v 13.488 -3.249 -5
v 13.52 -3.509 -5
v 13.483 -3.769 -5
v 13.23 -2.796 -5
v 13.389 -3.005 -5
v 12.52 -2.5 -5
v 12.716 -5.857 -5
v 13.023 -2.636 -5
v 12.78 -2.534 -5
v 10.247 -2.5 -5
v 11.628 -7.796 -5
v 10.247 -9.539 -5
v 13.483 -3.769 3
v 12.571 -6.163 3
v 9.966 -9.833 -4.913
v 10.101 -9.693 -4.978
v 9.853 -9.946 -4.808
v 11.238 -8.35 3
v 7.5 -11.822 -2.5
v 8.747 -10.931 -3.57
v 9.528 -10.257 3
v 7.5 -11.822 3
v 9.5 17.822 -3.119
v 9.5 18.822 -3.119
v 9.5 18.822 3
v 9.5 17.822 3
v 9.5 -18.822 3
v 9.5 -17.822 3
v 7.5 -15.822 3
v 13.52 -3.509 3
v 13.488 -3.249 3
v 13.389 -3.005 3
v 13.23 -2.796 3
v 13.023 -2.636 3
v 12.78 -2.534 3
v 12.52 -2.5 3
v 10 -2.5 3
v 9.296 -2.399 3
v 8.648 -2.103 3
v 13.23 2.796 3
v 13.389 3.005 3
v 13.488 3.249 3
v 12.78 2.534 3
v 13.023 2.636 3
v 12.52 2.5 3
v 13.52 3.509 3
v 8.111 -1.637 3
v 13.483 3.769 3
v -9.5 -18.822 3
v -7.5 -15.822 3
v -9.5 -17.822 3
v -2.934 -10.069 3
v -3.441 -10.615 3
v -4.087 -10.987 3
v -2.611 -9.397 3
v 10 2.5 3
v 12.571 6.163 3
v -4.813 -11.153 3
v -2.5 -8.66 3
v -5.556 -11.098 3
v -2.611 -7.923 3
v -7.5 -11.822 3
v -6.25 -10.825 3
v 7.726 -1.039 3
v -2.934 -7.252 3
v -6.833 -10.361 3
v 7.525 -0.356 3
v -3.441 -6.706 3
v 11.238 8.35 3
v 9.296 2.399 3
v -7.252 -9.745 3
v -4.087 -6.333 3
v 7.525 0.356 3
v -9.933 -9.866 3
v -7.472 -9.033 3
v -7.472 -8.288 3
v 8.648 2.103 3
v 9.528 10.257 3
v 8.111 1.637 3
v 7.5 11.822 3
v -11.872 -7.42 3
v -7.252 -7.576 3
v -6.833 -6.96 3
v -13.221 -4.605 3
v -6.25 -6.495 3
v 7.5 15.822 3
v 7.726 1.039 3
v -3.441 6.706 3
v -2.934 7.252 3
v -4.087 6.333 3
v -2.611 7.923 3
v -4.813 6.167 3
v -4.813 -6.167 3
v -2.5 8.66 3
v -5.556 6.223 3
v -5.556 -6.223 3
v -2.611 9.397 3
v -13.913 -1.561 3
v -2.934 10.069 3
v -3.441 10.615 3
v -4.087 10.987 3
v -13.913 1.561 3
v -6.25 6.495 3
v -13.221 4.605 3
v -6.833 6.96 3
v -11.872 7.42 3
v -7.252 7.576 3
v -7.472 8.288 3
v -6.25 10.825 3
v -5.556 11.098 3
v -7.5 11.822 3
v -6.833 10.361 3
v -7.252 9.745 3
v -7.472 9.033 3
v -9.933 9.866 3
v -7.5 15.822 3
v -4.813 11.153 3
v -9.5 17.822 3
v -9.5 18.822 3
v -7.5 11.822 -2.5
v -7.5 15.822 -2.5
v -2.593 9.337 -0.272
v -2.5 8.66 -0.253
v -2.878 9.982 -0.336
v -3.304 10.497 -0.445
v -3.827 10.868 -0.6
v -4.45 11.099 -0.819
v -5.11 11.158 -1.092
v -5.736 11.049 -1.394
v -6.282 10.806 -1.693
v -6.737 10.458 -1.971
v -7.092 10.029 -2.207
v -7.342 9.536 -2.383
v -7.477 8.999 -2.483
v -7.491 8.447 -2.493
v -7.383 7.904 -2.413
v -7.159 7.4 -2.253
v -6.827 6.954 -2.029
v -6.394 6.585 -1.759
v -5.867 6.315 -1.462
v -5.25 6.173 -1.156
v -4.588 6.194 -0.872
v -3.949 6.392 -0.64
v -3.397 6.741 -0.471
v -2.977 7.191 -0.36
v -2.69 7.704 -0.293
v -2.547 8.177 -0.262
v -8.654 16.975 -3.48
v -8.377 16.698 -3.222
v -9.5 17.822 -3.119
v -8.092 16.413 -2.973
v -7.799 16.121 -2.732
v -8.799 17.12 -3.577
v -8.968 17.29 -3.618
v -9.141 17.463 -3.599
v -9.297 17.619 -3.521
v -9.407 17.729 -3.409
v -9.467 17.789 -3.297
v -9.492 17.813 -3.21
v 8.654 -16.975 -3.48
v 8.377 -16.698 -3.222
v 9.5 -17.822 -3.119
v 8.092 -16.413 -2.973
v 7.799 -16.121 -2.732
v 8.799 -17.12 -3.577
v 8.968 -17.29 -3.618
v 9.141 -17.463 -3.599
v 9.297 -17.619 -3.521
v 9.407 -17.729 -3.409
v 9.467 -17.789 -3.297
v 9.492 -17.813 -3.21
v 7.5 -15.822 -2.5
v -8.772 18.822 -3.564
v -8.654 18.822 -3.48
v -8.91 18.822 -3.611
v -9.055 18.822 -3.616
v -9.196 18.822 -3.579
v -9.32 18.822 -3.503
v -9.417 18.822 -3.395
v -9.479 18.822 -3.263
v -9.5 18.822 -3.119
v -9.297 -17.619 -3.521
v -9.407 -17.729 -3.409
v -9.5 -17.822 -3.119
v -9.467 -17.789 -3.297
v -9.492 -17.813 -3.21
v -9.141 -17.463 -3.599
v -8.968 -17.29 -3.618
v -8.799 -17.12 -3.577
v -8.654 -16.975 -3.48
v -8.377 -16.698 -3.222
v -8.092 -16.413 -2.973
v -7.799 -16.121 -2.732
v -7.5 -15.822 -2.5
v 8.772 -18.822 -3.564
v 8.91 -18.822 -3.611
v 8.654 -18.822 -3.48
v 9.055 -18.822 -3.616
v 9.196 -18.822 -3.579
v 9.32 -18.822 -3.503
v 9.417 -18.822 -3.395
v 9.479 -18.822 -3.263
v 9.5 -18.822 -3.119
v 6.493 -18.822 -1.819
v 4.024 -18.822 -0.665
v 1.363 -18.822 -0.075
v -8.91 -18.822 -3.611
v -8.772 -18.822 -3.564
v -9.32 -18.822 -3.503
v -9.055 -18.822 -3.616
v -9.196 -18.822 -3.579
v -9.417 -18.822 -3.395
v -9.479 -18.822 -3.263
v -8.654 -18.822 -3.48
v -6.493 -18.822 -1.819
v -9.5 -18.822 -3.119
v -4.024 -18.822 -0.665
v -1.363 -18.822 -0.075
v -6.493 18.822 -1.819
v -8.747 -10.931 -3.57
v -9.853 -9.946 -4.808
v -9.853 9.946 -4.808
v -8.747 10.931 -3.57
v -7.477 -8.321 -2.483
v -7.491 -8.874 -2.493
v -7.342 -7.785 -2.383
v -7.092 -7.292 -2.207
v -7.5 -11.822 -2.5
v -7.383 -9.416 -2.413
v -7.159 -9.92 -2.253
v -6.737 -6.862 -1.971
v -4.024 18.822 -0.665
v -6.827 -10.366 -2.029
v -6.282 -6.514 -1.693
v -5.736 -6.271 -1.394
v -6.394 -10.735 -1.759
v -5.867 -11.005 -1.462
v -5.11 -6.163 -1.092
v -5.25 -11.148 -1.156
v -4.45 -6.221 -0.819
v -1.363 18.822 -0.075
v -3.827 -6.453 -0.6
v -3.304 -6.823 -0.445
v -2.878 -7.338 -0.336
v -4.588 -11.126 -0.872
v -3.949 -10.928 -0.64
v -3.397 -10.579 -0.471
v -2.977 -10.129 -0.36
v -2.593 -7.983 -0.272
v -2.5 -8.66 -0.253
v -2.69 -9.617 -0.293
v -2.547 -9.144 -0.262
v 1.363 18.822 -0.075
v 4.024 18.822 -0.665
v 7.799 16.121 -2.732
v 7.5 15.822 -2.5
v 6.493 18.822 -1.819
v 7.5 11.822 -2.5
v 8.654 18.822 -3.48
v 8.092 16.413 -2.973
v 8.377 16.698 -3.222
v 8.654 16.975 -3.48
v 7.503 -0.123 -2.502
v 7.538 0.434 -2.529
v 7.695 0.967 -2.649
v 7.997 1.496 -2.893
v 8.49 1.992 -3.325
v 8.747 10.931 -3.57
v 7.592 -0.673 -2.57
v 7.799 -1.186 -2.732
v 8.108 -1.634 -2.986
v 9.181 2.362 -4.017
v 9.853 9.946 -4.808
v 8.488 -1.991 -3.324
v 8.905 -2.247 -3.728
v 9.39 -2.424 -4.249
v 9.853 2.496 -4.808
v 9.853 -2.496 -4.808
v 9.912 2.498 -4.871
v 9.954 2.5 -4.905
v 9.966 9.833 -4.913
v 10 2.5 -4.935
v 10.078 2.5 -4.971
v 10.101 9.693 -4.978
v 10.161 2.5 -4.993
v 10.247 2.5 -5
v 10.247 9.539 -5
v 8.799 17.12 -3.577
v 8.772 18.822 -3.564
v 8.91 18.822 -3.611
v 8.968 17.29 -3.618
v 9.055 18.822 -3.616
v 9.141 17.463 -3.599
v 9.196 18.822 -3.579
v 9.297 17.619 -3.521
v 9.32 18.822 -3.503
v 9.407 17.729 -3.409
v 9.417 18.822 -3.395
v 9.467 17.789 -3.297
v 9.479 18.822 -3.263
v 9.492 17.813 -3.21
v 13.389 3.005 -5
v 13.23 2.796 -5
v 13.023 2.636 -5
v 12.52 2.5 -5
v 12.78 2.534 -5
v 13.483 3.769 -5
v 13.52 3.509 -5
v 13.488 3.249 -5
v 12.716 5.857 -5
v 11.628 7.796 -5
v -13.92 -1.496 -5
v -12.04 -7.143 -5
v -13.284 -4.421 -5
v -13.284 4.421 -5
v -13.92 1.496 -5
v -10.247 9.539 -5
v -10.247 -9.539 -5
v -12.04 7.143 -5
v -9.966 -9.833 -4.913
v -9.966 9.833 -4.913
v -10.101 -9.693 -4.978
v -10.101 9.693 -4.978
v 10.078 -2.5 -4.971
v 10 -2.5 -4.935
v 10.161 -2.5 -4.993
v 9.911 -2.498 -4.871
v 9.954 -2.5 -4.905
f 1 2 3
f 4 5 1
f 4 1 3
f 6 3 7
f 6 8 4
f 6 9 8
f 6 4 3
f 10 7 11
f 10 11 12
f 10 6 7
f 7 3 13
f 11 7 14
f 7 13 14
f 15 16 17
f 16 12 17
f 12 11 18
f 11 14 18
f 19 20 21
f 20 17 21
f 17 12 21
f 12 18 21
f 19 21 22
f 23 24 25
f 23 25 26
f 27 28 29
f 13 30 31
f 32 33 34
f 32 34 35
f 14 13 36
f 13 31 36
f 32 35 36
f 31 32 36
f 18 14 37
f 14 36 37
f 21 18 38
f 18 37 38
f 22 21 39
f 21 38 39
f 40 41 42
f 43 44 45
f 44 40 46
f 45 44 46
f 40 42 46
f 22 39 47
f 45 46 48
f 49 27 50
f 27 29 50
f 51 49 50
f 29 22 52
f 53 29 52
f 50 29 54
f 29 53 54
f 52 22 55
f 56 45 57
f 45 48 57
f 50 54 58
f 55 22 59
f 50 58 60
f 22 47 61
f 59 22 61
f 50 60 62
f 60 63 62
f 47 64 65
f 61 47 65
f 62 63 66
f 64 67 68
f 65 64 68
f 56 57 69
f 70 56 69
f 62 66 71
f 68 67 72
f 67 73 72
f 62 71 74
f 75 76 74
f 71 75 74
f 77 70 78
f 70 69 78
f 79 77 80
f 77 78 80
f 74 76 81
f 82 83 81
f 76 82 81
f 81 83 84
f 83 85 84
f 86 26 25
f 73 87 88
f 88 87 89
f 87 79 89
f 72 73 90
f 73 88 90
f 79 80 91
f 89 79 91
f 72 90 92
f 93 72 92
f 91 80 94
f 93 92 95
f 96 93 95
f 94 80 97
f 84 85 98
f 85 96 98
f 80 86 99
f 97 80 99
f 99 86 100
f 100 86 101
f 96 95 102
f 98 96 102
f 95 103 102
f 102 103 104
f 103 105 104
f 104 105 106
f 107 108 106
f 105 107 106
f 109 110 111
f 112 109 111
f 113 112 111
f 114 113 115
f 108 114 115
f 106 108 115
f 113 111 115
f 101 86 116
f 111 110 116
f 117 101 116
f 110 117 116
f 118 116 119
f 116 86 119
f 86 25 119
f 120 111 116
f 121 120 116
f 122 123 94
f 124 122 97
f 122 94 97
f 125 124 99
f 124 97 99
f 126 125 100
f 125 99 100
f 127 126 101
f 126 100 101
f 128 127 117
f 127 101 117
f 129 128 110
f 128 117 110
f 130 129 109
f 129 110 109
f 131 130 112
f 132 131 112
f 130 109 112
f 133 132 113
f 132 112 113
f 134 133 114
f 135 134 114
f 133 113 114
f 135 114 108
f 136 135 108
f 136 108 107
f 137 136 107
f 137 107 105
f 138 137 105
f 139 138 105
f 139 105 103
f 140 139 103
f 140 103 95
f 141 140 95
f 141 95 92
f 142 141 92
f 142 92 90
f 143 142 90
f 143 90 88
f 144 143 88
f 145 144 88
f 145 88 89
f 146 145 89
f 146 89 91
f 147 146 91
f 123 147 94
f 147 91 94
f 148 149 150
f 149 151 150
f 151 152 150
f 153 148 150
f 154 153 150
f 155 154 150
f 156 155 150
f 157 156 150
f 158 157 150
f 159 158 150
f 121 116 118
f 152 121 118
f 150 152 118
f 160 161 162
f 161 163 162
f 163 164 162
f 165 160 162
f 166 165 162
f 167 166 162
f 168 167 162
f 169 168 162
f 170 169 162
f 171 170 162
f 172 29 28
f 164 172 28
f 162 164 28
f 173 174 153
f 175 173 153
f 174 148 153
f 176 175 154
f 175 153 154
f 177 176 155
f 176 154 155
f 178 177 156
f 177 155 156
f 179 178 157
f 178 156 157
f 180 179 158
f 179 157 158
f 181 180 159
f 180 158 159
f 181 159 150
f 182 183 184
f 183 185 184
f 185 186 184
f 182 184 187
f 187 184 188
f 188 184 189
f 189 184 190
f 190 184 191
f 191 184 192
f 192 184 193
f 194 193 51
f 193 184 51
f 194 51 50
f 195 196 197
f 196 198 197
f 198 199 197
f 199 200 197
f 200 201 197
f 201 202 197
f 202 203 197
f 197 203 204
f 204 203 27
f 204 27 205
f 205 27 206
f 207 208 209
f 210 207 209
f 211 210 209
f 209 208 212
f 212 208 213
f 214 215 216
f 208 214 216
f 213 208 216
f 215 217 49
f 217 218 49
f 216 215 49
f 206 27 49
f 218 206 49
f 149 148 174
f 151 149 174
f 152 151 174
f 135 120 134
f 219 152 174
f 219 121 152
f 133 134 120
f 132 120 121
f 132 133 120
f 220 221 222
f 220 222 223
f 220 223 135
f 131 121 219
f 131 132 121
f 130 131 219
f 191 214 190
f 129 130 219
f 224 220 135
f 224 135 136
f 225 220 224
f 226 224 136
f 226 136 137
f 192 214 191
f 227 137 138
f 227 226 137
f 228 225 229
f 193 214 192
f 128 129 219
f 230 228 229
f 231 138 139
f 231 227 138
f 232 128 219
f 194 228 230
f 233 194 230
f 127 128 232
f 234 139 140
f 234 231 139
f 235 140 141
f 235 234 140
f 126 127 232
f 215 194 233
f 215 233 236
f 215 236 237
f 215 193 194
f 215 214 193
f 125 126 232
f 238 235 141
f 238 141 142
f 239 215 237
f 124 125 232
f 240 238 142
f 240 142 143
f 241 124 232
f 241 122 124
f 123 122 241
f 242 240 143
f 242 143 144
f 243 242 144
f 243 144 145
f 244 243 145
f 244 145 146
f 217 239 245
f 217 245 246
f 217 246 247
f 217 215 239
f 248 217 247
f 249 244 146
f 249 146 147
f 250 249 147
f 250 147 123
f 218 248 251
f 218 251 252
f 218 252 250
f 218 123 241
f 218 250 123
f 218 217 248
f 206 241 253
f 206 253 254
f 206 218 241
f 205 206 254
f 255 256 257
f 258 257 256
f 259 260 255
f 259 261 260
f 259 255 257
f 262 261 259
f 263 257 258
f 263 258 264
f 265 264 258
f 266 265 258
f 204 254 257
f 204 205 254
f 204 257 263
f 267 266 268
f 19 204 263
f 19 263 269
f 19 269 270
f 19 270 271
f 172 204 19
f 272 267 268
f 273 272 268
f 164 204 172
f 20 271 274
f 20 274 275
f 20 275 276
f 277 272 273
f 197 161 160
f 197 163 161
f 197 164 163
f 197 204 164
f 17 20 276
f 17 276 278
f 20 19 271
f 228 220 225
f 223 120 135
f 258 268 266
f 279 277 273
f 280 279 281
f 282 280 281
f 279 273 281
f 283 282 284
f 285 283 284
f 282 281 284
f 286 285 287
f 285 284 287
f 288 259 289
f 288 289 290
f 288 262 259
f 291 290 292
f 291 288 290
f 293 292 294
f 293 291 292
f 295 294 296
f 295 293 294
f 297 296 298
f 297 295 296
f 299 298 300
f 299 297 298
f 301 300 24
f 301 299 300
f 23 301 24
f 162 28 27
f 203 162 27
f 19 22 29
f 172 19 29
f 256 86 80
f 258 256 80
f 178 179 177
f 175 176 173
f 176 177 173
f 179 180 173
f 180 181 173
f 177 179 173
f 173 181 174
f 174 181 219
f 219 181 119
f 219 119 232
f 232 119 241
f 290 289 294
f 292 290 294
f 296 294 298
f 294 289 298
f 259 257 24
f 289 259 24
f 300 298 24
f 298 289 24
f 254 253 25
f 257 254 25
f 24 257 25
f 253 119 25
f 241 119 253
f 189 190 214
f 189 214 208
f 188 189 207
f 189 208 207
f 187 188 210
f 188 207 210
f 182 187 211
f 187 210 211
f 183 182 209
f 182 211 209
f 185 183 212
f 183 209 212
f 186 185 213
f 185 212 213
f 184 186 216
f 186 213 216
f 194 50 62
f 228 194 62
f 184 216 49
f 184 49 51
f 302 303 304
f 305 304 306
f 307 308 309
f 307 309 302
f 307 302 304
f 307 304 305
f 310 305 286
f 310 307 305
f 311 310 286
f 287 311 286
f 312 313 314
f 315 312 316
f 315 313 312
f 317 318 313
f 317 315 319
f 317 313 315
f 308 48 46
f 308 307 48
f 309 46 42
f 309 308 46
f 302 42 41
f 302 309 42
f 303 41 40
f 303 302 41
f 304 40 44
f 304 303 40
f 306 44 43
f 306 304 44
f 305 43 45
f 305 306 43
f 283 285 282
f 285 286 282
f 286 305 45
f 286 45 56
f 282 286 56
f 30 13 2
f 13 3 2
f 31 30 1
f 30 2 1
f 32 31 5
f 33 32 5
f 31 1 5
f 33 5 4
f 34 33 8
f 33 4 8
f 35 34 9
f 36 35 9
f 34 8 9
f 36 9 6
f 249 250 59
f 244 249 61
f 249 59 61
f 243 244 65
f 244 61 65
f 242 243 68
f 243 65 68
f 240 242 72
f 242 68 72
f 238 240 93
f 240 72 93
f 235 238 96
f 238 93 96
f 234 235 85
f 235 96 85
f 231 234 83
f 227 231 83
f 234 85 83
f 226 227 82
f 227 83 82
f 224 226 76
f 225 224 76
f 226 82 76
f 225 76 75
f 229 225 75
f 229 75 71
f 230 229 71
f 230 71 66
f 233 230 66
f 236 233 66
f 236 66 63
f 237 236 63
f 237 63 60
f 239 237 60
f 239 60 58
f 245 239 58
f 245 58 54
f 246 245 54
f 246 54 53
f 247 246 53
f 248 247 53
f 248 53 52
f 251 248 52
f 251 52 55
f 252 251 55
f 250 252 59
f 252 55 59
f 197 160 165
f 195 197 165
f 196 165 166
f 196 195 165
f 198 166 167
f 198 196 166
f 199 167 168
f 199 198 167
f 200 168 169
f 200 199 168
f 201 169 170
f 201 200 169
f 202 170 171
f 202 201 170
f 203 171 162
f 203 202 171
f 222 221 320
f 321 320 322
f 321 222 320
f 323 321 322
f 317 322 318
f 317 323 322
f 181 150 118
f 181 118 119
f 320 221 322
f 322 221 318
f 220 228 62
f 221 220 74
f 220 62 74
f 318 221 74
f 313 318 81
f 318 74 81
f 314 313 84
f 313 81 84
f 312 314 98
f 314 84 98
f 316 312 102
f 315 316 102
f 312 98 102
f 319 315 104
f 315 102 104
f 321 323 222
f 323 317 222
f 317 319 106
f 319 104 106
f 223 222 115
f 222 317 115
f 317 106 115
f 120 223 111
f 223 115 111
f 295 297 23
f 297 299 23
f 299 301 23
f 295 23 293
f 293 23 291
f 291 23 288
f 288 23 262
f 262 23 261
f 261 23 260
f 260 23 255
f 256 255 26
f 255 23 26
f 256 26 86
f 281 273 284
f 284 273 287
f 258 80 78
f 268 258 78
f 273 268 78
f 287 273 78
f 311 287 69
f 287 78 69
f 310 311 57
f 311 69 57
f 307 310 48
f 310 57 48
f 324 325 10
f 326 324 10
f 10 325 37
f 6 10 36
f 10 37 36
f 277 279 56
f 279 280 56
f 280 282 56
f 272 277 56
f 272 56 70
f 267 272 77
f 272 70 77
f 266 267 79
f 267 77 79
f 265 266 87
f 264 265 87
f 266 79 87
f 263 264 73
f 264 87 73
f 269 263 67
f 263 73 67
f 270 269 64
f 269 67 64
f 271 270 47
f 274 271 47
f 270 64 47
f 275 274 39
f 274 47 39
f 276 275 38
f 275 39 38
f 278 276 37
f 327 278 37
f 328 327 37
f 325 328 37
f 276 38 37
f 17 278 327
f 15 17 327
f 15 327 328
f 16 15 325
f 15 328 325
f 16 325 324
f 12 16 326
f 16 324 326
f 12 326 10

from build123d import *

# Parameters (mm, degrees)
SKETCH1_R               = 1.350662837
BOSS_EXTRUDE1_DEPTH     = 3
BOSS_EXTRUDE2_OUTLINE_R = 1.350662837
BOSS_EXTRUDE2_DEPTH     = 5
BOSS_EXTRUDE2_START     = -18.821590418
BOSS_EXTRUDE2_2_DEPTH   = 37.643180836
FILLET1_R               = 0.5
SKETCH5_R               = 2.5
CUT_EXTRUDE1_DEPTH      = 25.78411334
FILLET2_R               = 0.5
FILLET3_R               = 1


with BuildPart() as part:
    # Sketch1 → Boss-Extrude1 (new body)
    with BuildSketch(Plane.XY):
        with BuildLine():
            Line((7.5, 18.821590418), (9.5, 18.821590418))
            Line((9.5, 18.821590418), (9.5, 17.821590418))
            Line((9.5, 17.821590418), (7.5, 15.821590418))
            Line((7.5, 15.821590418), (7.5, 11.821590418))
            ThreePointArc((7.5, 11.821590418), (14, 0), (7.5, -11.821590418))
            Line((7.5, -11.821590418), (7.5, -15.821590418))
            Line((7.5, -15.821590418), (9.5, -17.821590418))
            Line((9.5, -17.821590418), (9.5, -18.821590418))
            Line((9.5, -18.821590418), (7.5, -18.821590418))
            Line((7.5, -18.821590418), (-7.5, -18.821590418))
            Line((-7.5, -18.821590418), (-9.5, -18.821590418))
            Line((-9.5, -18.821590418), (-9.5, -17.821590418))
            Line((-9.5, -17.821590418), (-7.5, -15.821590418))
            Line((-7.5, -15.821590418), (-7.5, -11.821590418))
            ThreePointArc((-7.5, -11.821590418), (-14, 0), (-7.5, 11.821590418))
            Line((-7.5, 11.821590418), (-7.5, 15.821590418))
            Line((-7.5, 15.821590418), (-9.5, 17.821590418))
            Line((-9.5, 17.821590418), (-9.5, 18.821590418))
            Line((-9.5, 18.821590418), (-7.5, 18.821590418))
            Line((-7.5, 18.821590418), (7.5, 18.821590418))
        make_face()
        with Locations((-5, -8.660254038)):
            Circle(SKETCH1_R, mode=Mode.SUBTRACT)
        with Locations((10, 0)):
            Circle(SKETCH1_R, mode=Mode.SUBTRACT)
        with Locations((-5, 8.660254038)):
            Circle(SKETCH1_R, mode=Mode.SUBTRACT)
    extrude(amount=BOSS_EXTRUDE1_DEPTH)

    # Boss-Extrude2: read off the stored shape, not the designer's step
    # Boss-Extrude2 outline → Boss-Extrude2 (add)
    with BuildSketch(Plane(origin=(0, 0, 0), x_dir=(-1, 0, 0), z_dir=(0, 0, -1))):
        with BuildLine():
            Line((-7.5, 15.821590418), (-7.5, 11.821590418))
            ThreePointArc((-7.5, 11.821590418), (-14, 0), (-7.5, -11.821590418))
            Line((-7.5, -11.821590418), (-7.5, -15.821590418))
            Line((-7.5, -15.821590418), (-9.5, -17.821590418))
            Line((-9.5, -17.821590418), (-9.5, -18.821590418))
            Line((-9.5, -18.821590418), (9.5, -18.821590418))
            Line((9.5, -18.821590418), (9.5, -17.821590418))
            Line((9.5, -17.821590418), (7.5, -15.821590418))
            Line((7.5, -15.821590418), (7.5, -11.821590418))
            ThreePointArc((7.5, -11.821590418), (14, 0), (7.5, 11.821590418))
            Line((7.5, 11.821590418), (7.5, 15.821590418))
            Line((7.5, 15.821590418), (9.5, 17.821590418))
            Line((9.5, 17.821590418), (9.5, 18.821590418))
            Line((9.5, 18.821590418), (-9.5, 18.821590418))
            Line((-9.5, 18.821590418), (-9.5, 17.821590418))
            Line((-9.5, 17.821590418), (-7.5, 15.821590418))
        make_face()
        with Locations((5, -8.660254038)):
            Circle(BOSS_EXTRUDE2_OUTLINE_R, mode=Mode.SUBTRACT)
        with Locations((-10, 0)):
            Circle(BOSS_EXTRUDE2_OUTLINE_R, mode=Mode.SUBTRACT)
        with Locations((5, 8.660254038)):
            Circle(BOSS_EXTRUDE2_OUTLINE_R, mode=Mode.SUBTRACT)
    extrude(amount=BOSS_EXTRUDE2_DEPTH)

    # Boss-Extrude2 2 outline → Boss-Extrude2 2 (cut)
    with BuildSketch(Plane(origin=(0, 0, 0), x_dir=(1, 0, 0), z_dir=(0, 1, 0)).offset(BOSS_EXTRUDE2_START)):
        with BuildLine():
            Line((10, 5), (-10, 5))
            ThreePointArc((-10, 5), (0, 0), (10, 5))
        make_face()
    extrude(amount=BOSS_EXTRUDE2_2_DEPTH, mode=Mode.SUBTRACT)

    # Fillet1
    fillet1_edges = [part.edges().sort_by_distance(p)[0] for p in [
        (9.5, 18.321590418, -4.375961595),
        (9.5, -18.321590418, -4.375961595),
        (-9.5, -18.321590418, -4.375961595),
        (-9.5, 18.321590418, -4.375961595),
    ]]
    fillet(fillet1_edges, radius=FILLET1_R)

    # Sketch5 → Cut-Extrude1 (cut, through all)
    with BuildSketch(Plane.XY.offset(3)):
        with Locations((-5, -8.660254038)):
            Circle(SKETCH5_R)
        with Locations((-5, 8.660254038)):
            Circle(SKETCH5_R)
        with BuildLine():
            Line((10, -2.5), (13.774977314, -2.5))
            ThreePointArc((13.774977314, -2.5), (14, 0), (13.774977314, 2.5))
            Line((13.774977314, 2.5), (10, 2.5))
            ThreePointArc((10, 2.5), (7.5, 0), (10, -2.5))
        make_face()
    extrude(amount=-CUT_EXTRUDE1_DEPTH, mode=Mode.SUBTRACT)

    # Fillet2
    fillet2_edges = [part.edges().sort_by_distance(p)[0] for p in [
        (-10, 0, -5),
        (10, -6.148979486, -5),
        (10, 6.148979486, -5),
    ]]
    fillet(fillet2_edges, radius=FILLET2_R)

    # Fillet3
    fillet3_edges = [part.edges().sort_by_distance(p)[0] for p in [
        (13.774977314, 2.5, -2.5),
        (13.774977314, -2.5, -2.5),
    ]]
    fillet(fillet3_edges, radius=FILLET3_R)


solid = part.part
